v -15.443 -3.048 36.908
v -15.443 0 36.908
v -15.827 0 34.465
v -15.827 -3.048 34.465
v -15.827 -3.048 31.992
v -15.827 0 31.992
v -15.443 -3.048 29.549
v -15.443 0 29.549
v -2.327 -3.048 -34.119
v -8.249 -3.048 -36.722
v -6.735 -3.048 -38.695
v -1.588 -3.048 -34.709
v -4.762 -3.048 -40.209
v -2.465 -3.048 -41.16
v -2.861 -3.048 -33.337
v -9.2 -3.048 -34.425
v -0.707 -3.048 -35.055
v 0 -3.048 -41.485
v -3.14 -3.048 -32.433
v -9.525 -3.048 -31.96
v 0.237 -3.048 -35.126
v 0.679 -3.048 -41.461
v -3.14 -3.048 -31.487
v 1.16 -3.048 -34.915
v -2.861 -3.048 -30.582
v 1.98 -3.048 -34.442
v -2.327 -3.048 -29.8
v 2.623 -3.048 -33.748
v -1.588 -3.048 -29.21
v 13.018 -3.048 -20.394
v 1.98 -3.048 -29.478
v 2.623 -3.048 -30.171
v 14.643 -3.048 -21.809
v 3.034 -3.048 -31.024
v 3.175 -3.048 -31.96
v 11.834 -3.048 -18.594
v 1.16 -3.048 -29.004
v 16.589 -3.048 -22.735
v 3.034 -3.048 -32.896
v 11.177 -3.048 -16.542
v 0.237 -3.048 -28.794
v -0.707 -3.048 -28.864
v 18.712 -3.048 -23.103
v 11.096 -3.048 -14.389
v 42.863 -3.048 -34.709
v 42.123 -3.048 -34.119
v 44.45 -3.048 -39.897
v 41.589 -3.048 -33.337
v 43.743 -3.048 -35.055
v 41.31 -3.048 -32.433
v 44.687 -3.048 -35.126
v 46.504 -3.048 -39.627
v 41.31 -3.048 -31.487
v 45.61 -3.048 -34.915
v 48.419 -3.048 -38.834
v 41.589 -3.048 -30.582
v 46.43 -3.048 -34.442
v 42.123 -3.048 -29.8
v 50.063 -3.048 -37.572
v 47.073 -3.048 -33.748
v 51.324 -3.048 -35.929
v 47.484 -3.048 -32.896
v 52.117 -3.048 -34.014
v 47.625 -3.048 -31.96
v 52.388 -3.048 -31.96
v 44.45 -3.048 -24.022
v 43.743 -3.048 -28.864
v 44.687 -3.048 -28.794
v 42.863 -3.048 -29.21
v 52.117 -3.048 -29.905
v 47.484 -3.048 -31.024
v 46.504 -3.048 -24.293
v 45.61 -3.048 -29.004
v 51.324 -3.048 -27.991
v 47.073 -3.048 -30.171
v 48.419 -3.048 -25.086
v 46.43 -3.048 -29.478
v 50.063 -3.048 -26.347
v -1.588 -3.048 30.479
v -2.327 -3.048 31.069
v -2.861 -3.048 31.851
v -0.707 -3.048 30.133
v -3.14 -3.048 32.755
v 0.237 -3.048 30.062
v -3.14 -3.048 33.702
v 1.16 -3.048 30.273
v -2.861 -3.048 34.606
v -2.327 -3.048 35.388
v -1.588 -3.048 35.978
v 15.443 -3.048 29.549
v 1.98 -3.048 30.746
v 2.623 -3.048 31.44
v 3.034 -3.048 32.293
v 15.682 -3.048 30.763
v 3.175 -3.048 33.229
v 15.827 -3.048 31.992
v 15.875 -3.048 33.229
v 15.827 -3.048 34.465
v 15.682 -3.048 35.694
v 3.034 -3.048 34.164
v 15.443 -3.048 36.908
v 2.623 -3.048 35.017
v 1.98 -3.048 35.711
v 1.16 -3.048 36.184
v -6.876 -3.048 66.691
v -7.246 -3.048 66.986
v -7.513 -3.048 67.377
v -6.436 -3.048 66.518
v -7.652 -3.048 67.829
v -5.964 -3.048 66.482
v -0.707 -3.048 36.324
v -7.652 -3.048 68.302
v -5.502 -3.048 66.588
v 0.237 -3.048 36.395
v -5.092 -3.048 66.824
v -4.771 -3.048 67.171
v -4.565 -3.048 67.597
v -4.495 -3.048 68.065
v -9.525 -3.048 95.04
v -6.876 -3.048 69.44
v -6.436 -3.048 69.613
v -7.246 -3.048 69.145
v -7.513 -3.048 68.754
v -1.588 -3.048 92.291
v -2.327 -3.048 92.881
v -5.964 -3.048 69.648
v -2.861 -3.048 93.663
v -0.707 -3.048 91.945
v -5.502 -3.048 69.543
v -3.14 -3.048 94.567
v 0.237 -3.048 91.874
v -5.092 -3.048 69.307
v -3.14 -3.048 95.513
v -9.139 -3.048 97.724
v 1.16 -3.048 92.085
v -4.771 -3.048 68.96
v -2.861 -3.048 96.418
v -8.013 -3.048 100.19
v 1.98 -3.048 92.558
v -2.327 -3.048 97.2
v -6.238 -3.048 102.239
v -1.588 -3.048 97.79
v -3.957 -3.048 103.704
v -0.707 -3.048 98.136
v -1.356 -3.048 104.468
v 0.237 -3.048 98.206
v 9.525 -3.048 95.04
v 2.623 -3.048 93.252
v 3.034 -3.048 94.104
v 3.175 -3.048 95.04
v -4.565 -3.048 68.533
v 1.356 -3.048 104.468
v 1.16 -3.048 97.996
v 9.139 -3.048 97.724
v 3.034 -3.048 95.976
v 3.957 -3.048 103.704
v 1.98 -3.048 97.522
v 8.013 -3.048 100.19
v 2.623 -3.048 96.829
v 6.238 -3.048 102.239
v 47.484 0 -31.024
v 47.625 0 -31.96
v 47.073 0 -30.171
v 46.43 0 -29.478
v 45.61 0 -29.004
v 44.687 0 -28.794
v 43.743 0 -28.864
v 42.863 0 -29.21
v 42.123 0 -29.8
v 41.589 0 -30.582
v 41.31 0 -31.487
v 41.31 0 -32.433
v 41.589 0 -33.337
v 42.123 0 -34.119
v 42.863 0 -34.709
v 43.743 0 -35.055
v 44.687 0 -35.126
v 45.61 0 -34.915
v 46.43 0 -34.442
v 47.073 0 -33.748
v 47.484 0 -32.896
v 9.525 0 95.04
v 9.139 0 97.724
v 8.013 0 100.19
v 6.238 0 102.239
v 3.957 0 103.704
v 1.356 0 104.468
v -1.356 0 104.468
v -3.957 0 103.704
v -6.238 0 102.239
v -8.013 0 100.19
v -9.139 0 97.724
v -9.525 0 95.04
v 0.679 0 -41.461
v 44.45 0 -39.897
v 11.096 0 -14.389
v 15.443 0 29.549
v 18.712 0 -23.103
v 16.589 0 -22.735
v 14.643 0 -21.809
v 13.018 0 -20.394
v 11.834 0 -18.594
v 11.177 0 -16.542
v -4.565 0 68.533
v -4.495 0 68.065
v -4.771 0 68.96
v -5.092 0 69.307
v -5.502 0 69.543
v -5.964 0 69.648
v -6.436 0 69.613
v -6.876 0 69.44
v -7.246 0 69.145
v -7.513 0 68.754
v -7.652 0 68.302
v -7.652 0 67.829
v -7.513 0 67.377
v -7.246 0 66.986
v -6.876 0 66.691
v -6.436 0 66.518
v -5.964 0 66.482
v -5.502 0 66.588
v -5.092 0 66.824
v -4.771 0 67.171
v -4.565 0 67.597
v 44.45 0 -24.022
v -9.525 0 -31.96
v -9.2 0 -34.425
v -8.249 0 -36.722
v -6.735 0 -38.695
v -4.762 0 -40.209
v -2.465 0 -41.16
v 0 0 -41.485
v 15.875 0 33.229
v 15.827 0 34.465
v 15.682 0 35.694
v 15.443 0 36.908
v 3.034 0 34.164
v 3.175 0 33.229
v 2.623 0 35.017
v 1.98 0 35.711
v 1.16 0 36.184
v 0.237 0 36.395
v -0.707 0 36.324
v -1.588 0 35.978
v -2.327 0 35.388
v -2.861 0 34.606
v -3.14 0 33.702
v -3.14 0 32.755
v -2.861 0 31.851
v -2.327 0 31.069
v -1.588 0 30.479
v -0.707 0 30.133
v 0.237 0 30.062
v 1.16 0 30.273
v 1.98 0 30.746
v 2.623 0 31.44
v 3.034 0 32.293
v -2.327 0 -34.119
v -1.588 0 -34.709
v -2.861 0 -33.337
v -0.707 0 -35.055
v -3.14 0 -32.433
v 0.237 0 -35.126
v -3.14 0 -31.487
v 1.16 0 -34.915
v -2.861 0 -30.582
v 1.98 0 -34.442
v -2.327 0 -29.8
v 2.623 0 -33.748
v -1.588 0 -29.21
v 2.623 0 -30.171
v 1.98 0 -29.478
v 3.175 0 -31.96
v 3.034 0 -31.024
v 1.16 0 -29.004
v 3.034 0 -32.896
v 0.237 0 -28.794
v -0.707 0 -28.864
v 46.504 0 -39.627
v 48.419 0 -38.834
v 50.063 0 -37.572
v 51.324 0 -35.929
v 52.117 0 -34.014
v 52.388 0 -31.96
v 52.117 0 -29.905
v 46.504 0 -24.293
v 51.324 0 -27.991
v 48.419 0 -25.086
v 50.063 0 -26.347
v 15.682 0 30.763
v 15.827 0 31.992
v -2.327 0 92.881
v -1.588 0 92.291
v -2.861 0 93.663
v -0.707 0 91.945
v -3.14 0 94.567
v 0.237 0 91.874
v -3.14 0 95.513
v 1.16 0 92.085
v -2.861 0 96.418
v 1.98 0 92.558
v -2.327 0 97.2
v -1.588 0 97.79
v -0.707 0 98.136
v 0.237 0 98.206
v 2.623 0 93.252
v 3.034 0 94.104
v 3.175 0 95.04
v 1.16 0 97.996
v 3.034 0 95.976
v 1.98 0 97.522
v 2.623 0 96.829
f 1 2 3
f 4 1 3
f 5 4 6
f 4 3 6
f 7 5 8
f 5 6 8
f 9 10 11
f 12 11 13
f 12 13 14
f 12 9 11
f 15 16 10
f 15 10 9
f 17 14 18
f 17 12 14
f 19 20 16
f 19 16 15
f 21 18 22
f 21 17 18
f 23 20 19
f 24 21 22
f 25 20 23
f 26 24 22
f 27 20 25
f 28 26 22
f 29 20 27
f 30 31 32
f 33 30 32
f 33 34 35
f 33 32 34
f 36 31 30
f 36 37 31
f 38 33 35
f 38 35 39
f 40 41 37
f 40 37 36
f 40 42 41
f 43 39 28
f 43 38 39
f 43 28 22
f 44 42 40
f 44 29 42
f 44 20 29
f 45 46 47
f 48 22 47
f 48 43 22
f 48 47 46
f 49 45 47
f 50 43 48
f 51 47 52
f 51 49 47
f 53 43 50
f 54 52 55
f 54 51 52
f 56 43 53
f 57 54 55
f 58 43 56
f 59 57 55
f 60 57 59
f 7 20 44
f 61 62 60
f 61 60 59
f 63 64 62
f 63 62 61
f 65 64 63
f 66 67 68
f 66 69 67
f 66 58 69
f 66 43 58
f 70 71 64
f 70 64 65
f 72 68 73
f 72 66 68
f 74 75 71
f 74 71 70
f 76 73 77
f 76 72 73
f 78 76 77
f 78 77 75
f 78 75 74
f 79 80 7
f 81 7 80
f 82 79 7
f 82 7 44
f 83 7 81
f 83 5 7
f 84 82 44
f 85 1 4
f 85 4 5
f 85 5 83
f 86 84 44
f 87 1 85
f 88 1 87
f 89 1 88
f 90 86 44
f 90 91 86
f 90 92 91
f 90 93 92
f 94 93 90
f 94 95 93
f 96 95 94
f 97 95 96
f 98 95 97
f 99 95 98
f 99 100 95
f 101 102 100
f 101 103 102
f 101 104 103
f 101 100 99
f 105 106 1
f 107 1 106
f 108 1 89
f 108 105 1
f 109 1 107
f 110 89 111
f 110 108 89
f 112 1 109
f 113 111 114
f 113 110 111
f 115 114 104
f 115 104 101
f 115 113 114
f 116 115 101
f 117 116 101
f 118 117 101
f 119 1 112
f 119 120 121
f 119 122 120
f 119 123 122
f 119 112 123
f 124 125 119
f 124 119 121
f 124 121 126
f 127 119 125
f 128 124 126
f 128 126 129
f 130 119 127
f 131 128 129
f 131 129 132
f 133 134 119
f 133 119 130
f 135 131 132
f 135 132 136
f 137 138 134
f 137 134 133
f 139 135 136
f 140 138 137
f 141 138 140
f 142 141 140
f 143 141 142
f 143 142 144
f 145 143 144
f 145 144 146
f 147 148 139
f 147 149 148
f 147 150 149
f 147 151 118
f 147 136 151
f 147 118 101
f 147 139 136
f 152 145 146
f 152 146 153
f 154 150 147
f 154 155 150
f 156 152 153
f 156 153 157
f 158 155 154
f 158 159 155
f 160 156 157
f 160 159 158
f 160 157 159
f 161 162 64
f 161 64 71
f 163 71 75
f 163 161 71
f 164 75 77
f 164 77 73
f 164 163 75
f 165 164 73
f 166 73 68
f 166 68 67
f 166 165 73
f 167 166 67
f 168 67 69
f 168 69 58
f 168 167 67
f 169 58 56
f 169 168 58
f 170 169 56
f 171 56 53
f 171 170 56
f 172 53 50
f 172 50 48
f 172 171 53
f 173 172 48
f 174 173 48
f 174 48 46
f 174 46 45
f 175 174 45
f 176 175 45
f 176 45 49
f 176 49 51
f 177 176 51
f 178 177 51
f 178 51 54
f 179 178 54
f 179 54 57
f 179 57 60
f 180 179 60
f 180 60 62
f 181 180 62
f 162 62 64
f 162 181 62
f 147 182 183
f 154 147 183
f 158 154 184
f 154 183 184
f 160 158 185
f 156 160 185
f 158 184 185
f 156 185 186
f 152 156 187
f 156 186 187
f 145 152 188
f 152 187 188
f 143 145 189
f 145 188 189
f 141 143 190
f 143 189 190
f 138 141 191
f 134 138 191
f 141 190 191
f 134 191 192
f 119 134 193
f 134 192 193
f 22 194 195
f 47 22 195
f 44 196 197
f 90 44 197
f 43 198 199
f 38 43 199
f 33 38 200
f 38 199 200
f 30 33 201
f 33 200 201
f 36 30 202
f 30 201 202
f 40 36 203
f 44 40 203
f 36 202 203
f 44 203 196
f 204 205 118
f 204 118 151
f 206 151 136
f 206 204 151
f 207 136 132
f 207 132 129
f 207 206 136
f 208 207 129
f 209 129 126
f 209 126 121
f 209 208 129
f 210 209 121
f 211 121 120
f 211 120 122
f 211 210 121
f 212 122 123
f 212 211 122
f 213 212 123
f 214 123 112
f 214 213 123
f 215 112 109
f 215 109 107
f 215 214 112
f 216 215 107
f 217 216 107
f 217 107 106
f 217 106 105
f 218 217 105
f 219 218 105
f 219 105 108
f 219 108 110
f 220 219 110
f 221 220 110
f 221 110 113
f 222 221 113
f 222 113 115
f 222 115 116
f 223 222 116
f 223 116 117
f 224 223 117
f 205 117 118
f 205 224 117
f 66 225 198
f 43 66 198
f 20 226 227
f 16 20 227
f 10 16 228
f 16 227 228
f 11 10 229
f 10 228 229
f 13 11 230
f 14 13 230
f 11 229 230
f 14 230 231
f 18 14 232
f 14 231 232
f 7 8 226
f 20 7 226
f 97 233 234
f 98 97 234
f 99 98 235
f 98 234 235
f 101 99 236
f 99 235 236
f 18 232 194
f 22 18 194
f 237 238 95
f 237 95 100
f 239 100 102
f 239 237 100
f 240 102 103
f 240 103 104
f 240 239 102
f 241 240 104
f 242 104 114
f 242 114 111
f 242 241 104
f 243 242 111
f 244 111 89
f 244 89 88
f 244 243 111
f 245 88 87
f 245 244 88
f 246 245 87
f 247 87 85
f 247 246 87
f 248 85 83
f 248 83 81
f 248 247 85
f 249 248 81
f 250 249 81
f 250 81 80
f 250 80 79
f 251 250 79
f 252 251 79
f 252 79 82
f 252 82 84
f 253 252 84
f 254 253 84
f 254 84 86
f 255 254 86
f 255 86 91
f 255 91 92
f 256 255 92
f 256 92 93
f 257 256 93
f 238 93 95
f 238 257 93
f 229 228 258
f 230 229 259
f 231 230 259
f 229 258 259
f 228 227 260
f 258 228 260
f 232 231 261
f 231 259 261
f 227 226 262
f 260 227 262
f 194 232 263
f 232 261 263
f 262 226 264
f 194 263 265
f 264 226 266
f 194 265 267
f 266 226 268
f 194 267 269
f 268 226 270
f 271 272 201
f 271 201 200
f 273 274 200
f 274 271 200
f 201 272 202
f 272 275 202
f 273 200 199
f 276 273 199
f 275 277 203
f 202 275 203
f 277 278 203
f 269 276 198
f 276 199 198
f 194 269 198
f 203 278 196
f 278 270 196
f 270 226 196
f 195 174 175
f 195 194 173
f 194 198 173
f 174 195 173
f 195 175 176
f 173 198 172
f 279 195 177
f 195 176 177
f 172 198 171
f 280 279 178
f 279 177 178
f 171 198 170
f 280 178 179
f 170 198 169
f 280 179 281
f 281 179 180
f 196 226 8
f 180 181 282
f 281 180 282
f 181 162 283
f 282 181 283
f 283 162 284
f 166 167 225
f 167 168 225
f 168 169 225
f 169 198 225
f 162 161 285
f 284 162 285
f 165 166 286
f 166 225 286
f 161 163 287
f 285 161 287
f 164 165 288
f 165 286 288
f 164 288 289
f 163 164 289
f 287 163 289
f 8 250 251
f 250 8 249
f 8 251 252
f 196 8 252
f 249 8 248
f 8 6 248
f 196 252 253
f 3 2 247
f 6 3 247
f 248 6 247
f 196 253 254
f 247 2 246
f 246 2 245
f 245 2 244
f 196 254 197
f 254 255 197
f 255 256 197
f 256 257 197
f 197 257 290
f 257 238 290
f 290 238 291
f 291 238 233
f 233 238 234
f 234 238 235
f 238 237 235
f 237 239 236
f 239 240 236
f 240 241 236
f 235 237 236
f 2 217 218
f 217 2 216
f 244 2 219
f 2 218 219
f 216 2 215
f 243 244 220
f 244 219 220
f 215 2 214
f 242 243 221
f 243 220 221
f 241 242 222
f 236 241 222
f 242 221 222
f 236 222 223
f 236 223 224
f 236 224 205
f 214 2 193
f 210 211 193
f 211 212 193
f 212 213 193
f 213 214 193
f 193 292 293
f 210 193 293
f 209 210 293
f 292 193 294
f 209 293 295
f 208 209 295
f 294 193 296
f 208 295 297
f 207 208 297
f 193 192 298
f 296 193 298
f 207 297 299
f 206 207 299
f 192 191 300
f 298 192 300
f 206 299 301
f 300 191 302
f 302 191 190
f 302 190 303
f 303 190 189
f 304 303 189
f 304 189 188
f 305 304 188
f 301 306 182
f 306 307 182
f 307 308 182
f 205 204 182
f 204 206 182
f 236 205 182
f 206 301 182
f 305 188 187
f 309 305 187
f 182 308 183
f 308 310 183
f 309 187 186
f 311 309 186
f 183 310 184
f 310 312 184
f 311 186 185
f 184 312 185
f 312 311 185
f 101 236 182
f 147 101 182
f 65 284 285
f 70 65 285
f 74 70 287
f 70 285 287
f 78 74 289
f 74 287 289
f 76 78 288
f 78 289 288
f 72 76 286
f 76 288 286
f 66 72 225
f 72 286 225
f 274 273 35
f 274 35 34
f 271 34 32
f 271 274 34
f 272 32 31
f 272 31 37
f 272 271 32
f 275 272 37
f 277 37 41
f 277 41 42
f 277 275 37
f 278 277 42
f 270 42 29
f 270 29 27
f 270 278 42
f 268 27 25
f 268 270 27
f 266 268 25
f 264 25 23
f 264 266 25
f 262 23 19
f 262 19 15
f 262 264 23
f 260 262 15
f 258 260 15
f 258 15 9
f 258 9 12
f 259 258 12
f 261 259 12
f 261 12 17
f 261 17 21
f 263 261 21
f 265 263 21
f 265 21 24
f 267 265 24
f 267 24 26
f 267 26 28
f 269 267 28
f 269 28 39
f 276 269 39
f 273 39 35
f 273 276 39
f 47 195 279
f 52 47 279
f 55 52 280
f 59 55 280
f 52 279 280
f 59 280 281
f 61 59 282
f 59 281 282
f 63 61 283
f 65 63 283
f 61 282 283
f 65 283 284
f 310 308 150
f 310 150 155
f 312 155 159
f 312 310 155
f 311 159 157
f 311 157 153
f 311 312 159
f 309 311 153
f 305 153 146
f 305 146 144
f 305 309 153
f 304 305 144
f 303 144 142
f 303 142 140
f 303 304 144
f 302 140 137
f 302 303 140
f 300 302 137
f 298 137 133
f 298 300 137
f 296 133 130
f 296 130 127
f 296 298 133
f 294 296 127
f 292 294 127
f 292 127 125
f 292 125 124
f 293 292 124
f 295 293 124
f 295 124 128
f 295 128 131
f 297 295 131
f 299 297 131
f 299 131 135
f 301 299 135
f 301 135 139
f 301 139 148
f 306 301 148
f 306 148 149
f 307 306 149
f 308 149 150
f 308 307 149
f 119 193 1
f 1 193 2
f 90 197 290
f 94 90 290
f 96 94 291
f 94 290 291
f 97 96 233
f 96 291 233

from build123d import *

# Parameters (mm, degrees)
F0_R     = 1.5875
F0_R_2   = 3.175
F1_DEPTH = 3.048


with BuildPart() as f1:
    # F0 (on Front) → F1 (new body)
    with BuildSketch(Plane.XZ):
        with BuildLine():
            Line((15.442731, 36.907912), (9.525, 95.04018))
            ThreePointArc((9.525, 95.04018), (0, 85.51518), (-9.525, 95.04018))
            Line((-9.525, 95.04018), (-15.442731, 36.907912))
            ThreePointArc((-15.442731, 36.907912), (0, 49.103551), (15.442731, 36.907912))
        make_face()
        with Locations((-6.082257, 68.06538)):
            Circle(F0_R, mode=Mode.SUBTRACT)
        with BuildLine():
            ThreePointArc((-9.525, 95.04018), (0, 85.51518), (9.525, 95.04018))
            ThreePointArc((9.525, 95.04018), (0, 104.56518), (-9.525, 95.04018))
        make_face()
        with Locations((0, 95.04018)):
            Circle(F0_R_2, mode=Mode.SUBTRACT)
        with BuildLine():
            ThreePointArc((15.875, 33.228551), (15.766562, 35.080885), (15.442731, 36.907912))
            ThreePointArc((15.442731, 36.907912), (0, 49.103551), (-15.442731, 36.907912))
            ThreePointArc((-15.442731, 36.907912), (-15.875, 33.228551), (-15.442731, 29.549191))
            ThreePointArc((-15.442731, 29.549191), (0, 17.353551), (15.442731, 29.549191))
            ThreePointArc((15.442731, 29.549191), (15.766562, 31.376218), (15.875, 33.228551))
        make_face()
        with Locations((0, 33.228551)):
            Circle(F0_R_2, mode=Mode.SUBTRACT)
        with BuildLine():
            ThreePointArc((9.525, -31.95982), (0, -22.43482), (-9.525, -31.95982))
            ThreePointArc((-9.525, -31.95982), (-6.735192, -38.695012), (0, -41.48482))
            Line((0, -41.48482), (0.67949, -41.460552))
            ThreePointArc((0.67949, -41.460552), (6.97129, -38.450331), (9.525, -31.95982))
        make_face()
        with Locations((0, -31.95982)):
            Circle(F0_R_2, mode=Mode.SUBTRACT)
        with BuildLine():
            ThreePointArc((52.3875, -31.95982), (50.06266, -26.347159), (44.45, -24.02232))
            ThreePointArc((44.45, -24.02232), (36.5125, -31.95982), (44.45, -39.89732))
            ThreePointArc((44.45, -39.89732), (50.06266, -37.57248), (52.3875, -31.95982))
        make_face()
        with Locations((44.45, -31.95982)):
            Circle(F0_R_2, mode=Mode.SUBTRACT)
        with BuildLine():
            ThreePointArc((15.442731, 29.549191), (0, 17.353551), (-15.442731, 29.549191))
            Line((-15.442731, 29.549191), (-9.525, -31.95982))
            ThreePointArc((-9.525, -31.95982), (0, -22.43482), (9.525, -31.95982))
            ThreePointArc((9.525, -31.95982), (6.97129, -38.450331), (0.67949, -41.460552))
            Line((0.67949, -41.460552), (44.45, -39.89732))
            ThreePointArc((44.45, -39.89732), (36.5125, -31.95982), (44.45, -24.02232))
            Line((44.45, -24.02232), (18.711782, -23.103097))
            ThreePointArc((18.711782, -23.103097), (13.018458, -20.39405), (11.096139, -14.389255))
            Line((11.096139, -14.389255), (15.442731, 29.549191))
        make_face()
    extrude(amount=F1_DEPTH)


solid = f1.part
